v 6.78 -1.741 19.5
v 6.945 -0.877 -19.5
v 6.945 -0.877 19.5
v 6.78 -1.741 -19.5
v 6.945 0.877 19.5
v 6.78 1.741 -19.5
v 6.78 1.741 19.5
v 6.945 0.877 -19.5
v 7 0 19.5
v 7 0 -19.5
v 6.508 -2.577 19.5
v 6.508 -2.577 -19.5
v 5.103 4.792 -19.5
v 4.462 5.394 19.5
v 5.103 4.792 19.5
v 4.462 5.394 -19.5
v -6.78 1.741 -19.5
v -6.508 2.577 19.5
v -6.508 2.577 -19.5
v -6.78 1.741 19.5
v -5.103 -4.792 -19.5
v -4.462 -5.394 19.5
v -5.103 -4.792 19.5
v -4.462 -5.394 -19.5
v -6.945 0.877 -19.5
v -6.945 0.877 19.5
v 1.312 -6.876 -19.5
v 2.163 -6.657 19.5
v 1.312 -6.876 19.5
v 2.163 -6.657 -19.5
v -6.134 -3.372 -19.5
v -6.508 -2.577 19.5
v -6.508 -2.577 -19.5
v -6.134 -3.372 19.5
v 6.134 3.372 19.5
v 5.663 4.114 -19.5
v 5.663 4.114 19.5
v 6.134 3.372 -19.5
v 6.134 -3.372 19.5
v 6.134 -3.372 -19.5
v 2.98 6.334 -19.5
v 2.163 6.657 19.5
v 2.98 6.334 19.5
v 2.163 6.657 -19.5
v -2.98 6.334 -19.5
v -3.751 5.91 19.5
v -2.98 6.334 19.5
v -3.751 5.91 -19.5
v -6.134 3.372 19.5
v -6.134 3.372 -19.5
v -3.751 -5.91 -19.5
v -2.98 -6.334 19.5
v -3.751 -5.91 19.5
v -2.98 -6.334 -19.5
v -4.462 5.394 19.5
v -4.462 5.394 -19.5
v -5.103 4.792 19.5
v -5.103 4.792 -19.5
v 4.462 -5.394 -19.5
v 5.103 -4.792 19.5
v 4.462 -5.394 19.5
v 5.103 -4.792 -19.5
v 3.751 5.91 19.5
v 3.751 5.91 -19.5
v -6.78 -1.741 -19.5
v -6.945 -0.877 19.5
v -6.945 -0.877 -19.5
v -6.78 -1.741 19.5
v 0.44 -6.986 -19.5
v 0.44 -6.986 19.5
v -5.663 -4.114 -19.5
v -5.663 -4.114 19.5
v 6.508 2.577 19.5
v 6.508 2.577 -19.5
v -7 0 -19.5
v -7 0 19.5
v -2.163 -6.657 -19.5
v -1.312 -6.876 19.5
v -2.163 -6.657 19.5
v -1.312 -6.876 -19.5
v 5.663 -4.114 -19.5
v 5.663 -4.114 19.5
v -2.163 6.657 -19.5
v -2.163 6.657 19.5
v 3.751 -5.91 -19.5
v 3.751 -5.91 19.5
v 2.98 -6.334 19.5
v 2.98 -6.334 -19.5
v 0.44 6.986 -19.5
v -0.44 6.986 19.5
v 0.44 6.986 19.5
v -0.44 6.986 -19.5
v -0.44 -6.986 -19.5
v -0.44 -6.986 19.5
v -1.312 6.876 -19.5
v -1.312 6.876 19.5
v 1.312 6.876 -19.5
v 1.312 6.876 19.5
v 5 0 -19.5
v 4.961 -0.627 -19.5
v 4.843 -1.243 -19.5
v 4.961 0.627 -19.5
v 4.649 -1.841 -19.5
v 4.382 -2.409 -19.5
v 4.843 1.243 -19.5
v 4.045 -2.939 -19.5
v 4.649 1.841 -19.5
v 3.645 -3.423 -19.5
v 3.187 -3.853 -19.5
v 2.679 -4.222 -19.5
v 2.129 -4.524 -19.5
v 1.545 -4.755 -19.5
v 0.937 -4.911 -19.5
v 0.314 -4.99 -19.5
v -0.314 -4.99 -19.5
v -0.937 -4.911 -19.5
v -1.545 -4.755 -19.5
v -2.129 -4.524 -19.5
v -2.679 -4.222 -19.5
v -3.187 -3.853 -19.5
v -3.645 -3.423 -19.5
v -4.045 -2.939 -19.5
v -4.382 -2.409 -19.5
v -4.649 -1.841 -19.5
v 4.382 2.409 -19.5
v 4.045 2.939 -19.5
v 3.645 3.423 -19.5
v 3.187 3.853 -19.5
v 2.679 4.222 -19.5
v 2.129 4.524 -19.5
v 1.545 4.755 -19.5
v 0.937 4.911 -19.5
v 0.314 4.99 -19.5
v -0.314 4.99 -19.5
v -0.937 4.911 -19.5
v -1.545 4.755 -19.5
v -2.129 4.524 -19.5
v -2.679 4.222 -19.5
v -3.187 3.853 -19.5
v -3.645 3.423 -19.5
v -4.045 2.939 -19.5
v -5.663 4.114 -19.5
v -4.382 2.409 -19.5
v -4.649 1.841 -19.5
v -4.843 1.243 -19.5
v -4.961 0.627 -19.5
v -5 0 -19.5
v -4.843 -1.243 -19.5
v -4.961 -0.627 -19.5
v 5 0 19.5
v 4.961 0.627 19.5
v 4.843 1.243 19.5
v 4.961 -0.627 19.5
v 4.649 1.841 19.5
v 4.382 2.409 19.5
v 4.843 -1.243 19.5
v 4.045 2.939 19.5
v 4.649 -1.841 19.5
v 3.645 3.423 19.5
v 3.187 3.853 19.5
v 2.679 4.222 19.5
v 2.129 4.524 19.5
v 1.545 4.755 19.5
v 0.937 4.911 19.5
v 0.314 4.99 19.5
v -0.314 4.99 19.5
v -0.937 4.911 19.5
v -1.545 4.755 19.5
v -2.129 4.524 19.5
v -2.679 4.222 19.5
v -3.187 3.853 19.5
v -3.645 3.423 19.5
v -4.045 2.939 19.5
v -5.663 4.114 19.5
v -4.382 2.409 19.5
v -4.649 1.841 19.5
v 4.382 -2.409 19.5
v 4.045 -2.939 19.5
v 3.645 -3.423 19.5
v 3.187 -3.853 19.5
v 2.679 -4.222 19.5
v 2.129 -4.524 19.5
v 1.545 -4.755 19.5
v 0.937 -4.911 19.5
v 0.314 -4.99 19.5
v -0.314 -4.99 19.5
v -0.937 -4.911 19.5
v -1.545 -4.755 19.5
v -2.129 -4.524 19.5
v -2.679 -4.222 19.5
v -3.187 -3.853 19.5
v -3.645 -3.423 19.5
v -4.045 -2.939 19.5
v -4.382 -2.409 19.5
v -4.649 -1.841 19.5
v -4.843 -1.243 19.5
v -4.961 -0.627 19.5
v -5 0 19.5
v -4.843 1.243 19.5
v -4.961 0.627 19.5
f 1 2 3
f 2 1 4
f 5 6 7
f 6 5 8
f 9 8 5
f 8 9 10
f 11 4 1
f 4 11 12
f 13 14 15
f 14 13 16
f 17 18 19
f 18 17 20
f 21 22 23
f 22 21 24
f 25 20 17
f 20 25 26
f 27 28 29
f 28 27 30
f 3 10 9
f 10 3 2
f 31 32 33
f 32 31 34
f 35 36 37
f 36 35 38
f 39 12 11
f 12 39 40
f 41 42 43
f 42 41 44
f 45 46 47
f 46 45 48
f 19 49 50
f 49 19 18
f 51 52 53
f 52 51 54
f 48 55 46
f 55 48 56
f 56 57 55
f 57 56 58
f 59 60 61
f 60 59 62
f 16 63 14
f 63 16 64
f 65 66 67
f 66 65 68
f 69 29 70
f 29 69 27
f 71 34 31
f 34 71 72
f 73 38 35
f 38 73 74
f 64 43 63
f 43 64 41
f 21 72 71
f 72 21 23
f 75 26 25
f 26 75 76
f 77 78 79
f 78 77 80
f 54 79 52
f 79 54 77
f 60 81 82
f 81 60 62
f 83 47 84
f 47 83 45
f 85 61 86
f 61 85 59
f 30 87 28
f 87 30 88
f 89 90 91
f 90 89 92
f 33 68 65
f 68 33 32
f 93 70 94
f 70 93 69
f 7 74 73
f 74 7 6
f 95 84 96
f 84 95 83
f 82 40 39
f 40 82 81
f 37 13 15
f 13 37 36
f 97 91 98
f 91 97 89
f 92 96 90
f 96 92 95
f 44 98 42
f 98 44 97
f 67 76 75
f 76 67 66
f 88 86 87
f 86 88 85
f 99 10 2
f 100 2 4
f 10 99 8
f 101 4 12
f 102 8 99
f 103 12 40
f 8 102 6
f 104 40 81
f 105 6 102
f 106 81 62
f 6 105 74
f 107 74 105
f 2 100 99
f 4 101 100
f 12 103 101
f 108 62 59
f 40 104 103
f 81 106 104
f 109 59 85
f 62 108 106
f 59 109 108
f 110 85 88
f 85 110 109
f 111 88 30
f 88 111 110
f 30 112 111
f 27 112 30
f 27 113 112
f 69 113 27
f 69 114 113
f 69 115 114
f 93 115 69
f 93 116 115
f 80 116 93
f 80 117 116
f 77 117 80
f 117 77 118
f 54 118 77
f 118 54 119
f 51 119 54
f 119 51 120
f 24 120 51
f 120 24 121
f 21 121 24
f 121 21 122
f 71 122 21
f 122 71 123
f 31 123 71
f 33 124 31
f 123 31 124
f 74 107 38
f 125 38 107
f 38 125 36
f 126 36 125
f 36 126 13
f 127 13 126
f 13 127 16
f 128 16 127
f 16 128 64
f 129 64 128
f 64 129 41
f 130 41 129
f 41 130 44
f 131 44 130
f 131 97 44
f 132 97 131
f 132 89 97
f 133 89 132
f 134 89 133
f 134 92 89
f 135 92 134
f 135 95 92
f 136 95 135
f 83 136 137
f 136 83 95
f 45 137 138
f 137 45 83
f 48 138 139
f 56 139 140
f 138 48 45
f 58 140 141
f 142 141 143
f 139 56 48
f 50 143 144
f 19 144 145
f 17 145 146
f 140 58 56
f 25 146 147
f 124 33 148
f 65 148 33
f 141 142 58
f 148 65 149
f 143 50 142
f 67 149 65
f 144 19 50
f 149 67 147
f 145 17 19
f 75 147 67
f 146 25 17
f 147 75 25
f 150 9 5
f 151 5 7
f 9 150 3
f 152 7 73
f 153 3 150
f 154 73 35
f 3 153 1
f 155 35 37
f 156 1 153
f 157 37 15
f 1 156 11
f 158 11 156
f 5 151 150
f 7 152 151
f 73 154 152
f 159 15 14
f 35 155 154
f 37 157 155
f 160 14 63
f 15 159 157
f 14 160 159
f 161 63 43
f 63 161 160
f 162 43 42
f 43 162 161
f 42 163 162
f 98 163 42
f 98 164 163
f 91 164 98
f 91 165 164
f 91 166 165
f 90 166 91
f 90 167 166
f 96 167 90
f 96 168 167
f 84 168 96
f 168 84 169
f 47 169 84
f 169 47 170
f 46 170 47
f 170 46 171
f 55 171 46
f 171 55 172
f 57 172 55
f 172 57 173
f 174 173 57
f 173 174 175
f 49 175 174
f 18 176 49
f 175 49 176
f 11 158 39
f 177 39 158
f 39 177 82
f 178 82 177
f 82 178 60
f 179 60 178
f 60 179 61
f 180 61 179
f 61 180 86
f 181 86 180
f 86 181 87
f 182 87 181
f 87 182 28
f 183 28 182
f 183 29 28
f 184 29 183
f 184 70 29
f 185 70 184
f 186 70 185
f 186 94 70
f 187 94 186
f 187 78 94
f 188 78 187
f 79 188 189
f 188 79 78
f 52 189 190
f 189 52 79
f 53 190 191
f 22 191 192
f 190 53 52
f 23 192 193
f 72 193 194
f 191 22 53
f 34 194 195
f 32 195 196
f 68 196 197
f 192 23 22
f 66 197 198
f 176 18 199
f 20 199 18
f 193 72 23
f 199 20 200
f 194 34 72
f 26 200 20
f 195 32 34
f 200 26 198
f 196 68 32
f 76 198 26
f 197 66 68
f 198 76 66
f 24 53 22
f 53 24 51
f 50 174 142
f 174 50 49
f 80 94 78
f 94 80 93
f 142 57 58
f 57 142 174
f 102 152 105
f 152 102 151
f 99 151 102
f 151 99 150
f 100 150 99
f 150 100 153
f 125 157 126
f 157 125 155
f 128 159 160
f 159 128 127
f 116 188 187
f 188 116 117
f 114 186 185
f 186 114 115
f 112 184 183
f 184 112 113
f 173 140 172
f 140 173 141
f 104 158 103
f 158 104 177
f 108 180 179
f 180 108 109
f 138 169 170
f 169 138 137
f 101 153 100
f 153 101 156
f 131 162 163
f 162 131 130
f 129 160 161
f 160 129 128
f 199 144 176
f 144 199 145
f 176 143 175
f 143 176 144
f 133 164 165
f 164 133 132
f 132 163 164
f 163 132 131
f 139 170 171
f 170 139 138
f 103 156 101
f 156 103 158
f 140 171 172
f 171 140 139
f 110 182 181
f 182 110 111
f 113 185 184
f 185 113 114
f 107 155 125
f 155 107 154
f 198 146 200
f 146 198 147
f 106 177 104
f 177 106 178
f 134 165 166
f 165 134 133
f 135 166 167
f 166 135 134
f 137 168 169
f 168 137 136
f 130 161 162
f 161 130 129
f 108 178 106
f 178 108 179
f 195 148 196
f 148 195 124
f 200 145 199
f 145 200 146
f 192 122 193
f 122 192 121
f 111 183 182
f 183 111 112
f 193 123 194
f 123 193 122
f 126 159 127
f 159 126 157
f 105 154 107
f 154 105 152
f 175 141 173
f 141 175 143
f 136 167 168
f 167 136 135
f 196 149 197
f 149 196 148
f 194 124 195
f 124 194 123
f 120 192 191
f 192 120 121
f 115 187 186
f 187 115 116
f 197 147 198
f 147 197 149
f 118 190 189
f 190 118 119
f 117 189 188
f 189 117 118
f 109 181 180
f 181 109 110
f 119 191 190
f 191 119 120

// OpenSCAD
$fn = 50;


difference() {
	union() {
		translate(v = [0, 0, -19.5000000000]) {
			cylinder(h = 39, r = 7.0000000000);
		}
	}
	union() {
		translate(v = [0, 0, -100.0000000000]) {
			cylinder(h = 200, r = 5.0000000000);
		}
	}
}
